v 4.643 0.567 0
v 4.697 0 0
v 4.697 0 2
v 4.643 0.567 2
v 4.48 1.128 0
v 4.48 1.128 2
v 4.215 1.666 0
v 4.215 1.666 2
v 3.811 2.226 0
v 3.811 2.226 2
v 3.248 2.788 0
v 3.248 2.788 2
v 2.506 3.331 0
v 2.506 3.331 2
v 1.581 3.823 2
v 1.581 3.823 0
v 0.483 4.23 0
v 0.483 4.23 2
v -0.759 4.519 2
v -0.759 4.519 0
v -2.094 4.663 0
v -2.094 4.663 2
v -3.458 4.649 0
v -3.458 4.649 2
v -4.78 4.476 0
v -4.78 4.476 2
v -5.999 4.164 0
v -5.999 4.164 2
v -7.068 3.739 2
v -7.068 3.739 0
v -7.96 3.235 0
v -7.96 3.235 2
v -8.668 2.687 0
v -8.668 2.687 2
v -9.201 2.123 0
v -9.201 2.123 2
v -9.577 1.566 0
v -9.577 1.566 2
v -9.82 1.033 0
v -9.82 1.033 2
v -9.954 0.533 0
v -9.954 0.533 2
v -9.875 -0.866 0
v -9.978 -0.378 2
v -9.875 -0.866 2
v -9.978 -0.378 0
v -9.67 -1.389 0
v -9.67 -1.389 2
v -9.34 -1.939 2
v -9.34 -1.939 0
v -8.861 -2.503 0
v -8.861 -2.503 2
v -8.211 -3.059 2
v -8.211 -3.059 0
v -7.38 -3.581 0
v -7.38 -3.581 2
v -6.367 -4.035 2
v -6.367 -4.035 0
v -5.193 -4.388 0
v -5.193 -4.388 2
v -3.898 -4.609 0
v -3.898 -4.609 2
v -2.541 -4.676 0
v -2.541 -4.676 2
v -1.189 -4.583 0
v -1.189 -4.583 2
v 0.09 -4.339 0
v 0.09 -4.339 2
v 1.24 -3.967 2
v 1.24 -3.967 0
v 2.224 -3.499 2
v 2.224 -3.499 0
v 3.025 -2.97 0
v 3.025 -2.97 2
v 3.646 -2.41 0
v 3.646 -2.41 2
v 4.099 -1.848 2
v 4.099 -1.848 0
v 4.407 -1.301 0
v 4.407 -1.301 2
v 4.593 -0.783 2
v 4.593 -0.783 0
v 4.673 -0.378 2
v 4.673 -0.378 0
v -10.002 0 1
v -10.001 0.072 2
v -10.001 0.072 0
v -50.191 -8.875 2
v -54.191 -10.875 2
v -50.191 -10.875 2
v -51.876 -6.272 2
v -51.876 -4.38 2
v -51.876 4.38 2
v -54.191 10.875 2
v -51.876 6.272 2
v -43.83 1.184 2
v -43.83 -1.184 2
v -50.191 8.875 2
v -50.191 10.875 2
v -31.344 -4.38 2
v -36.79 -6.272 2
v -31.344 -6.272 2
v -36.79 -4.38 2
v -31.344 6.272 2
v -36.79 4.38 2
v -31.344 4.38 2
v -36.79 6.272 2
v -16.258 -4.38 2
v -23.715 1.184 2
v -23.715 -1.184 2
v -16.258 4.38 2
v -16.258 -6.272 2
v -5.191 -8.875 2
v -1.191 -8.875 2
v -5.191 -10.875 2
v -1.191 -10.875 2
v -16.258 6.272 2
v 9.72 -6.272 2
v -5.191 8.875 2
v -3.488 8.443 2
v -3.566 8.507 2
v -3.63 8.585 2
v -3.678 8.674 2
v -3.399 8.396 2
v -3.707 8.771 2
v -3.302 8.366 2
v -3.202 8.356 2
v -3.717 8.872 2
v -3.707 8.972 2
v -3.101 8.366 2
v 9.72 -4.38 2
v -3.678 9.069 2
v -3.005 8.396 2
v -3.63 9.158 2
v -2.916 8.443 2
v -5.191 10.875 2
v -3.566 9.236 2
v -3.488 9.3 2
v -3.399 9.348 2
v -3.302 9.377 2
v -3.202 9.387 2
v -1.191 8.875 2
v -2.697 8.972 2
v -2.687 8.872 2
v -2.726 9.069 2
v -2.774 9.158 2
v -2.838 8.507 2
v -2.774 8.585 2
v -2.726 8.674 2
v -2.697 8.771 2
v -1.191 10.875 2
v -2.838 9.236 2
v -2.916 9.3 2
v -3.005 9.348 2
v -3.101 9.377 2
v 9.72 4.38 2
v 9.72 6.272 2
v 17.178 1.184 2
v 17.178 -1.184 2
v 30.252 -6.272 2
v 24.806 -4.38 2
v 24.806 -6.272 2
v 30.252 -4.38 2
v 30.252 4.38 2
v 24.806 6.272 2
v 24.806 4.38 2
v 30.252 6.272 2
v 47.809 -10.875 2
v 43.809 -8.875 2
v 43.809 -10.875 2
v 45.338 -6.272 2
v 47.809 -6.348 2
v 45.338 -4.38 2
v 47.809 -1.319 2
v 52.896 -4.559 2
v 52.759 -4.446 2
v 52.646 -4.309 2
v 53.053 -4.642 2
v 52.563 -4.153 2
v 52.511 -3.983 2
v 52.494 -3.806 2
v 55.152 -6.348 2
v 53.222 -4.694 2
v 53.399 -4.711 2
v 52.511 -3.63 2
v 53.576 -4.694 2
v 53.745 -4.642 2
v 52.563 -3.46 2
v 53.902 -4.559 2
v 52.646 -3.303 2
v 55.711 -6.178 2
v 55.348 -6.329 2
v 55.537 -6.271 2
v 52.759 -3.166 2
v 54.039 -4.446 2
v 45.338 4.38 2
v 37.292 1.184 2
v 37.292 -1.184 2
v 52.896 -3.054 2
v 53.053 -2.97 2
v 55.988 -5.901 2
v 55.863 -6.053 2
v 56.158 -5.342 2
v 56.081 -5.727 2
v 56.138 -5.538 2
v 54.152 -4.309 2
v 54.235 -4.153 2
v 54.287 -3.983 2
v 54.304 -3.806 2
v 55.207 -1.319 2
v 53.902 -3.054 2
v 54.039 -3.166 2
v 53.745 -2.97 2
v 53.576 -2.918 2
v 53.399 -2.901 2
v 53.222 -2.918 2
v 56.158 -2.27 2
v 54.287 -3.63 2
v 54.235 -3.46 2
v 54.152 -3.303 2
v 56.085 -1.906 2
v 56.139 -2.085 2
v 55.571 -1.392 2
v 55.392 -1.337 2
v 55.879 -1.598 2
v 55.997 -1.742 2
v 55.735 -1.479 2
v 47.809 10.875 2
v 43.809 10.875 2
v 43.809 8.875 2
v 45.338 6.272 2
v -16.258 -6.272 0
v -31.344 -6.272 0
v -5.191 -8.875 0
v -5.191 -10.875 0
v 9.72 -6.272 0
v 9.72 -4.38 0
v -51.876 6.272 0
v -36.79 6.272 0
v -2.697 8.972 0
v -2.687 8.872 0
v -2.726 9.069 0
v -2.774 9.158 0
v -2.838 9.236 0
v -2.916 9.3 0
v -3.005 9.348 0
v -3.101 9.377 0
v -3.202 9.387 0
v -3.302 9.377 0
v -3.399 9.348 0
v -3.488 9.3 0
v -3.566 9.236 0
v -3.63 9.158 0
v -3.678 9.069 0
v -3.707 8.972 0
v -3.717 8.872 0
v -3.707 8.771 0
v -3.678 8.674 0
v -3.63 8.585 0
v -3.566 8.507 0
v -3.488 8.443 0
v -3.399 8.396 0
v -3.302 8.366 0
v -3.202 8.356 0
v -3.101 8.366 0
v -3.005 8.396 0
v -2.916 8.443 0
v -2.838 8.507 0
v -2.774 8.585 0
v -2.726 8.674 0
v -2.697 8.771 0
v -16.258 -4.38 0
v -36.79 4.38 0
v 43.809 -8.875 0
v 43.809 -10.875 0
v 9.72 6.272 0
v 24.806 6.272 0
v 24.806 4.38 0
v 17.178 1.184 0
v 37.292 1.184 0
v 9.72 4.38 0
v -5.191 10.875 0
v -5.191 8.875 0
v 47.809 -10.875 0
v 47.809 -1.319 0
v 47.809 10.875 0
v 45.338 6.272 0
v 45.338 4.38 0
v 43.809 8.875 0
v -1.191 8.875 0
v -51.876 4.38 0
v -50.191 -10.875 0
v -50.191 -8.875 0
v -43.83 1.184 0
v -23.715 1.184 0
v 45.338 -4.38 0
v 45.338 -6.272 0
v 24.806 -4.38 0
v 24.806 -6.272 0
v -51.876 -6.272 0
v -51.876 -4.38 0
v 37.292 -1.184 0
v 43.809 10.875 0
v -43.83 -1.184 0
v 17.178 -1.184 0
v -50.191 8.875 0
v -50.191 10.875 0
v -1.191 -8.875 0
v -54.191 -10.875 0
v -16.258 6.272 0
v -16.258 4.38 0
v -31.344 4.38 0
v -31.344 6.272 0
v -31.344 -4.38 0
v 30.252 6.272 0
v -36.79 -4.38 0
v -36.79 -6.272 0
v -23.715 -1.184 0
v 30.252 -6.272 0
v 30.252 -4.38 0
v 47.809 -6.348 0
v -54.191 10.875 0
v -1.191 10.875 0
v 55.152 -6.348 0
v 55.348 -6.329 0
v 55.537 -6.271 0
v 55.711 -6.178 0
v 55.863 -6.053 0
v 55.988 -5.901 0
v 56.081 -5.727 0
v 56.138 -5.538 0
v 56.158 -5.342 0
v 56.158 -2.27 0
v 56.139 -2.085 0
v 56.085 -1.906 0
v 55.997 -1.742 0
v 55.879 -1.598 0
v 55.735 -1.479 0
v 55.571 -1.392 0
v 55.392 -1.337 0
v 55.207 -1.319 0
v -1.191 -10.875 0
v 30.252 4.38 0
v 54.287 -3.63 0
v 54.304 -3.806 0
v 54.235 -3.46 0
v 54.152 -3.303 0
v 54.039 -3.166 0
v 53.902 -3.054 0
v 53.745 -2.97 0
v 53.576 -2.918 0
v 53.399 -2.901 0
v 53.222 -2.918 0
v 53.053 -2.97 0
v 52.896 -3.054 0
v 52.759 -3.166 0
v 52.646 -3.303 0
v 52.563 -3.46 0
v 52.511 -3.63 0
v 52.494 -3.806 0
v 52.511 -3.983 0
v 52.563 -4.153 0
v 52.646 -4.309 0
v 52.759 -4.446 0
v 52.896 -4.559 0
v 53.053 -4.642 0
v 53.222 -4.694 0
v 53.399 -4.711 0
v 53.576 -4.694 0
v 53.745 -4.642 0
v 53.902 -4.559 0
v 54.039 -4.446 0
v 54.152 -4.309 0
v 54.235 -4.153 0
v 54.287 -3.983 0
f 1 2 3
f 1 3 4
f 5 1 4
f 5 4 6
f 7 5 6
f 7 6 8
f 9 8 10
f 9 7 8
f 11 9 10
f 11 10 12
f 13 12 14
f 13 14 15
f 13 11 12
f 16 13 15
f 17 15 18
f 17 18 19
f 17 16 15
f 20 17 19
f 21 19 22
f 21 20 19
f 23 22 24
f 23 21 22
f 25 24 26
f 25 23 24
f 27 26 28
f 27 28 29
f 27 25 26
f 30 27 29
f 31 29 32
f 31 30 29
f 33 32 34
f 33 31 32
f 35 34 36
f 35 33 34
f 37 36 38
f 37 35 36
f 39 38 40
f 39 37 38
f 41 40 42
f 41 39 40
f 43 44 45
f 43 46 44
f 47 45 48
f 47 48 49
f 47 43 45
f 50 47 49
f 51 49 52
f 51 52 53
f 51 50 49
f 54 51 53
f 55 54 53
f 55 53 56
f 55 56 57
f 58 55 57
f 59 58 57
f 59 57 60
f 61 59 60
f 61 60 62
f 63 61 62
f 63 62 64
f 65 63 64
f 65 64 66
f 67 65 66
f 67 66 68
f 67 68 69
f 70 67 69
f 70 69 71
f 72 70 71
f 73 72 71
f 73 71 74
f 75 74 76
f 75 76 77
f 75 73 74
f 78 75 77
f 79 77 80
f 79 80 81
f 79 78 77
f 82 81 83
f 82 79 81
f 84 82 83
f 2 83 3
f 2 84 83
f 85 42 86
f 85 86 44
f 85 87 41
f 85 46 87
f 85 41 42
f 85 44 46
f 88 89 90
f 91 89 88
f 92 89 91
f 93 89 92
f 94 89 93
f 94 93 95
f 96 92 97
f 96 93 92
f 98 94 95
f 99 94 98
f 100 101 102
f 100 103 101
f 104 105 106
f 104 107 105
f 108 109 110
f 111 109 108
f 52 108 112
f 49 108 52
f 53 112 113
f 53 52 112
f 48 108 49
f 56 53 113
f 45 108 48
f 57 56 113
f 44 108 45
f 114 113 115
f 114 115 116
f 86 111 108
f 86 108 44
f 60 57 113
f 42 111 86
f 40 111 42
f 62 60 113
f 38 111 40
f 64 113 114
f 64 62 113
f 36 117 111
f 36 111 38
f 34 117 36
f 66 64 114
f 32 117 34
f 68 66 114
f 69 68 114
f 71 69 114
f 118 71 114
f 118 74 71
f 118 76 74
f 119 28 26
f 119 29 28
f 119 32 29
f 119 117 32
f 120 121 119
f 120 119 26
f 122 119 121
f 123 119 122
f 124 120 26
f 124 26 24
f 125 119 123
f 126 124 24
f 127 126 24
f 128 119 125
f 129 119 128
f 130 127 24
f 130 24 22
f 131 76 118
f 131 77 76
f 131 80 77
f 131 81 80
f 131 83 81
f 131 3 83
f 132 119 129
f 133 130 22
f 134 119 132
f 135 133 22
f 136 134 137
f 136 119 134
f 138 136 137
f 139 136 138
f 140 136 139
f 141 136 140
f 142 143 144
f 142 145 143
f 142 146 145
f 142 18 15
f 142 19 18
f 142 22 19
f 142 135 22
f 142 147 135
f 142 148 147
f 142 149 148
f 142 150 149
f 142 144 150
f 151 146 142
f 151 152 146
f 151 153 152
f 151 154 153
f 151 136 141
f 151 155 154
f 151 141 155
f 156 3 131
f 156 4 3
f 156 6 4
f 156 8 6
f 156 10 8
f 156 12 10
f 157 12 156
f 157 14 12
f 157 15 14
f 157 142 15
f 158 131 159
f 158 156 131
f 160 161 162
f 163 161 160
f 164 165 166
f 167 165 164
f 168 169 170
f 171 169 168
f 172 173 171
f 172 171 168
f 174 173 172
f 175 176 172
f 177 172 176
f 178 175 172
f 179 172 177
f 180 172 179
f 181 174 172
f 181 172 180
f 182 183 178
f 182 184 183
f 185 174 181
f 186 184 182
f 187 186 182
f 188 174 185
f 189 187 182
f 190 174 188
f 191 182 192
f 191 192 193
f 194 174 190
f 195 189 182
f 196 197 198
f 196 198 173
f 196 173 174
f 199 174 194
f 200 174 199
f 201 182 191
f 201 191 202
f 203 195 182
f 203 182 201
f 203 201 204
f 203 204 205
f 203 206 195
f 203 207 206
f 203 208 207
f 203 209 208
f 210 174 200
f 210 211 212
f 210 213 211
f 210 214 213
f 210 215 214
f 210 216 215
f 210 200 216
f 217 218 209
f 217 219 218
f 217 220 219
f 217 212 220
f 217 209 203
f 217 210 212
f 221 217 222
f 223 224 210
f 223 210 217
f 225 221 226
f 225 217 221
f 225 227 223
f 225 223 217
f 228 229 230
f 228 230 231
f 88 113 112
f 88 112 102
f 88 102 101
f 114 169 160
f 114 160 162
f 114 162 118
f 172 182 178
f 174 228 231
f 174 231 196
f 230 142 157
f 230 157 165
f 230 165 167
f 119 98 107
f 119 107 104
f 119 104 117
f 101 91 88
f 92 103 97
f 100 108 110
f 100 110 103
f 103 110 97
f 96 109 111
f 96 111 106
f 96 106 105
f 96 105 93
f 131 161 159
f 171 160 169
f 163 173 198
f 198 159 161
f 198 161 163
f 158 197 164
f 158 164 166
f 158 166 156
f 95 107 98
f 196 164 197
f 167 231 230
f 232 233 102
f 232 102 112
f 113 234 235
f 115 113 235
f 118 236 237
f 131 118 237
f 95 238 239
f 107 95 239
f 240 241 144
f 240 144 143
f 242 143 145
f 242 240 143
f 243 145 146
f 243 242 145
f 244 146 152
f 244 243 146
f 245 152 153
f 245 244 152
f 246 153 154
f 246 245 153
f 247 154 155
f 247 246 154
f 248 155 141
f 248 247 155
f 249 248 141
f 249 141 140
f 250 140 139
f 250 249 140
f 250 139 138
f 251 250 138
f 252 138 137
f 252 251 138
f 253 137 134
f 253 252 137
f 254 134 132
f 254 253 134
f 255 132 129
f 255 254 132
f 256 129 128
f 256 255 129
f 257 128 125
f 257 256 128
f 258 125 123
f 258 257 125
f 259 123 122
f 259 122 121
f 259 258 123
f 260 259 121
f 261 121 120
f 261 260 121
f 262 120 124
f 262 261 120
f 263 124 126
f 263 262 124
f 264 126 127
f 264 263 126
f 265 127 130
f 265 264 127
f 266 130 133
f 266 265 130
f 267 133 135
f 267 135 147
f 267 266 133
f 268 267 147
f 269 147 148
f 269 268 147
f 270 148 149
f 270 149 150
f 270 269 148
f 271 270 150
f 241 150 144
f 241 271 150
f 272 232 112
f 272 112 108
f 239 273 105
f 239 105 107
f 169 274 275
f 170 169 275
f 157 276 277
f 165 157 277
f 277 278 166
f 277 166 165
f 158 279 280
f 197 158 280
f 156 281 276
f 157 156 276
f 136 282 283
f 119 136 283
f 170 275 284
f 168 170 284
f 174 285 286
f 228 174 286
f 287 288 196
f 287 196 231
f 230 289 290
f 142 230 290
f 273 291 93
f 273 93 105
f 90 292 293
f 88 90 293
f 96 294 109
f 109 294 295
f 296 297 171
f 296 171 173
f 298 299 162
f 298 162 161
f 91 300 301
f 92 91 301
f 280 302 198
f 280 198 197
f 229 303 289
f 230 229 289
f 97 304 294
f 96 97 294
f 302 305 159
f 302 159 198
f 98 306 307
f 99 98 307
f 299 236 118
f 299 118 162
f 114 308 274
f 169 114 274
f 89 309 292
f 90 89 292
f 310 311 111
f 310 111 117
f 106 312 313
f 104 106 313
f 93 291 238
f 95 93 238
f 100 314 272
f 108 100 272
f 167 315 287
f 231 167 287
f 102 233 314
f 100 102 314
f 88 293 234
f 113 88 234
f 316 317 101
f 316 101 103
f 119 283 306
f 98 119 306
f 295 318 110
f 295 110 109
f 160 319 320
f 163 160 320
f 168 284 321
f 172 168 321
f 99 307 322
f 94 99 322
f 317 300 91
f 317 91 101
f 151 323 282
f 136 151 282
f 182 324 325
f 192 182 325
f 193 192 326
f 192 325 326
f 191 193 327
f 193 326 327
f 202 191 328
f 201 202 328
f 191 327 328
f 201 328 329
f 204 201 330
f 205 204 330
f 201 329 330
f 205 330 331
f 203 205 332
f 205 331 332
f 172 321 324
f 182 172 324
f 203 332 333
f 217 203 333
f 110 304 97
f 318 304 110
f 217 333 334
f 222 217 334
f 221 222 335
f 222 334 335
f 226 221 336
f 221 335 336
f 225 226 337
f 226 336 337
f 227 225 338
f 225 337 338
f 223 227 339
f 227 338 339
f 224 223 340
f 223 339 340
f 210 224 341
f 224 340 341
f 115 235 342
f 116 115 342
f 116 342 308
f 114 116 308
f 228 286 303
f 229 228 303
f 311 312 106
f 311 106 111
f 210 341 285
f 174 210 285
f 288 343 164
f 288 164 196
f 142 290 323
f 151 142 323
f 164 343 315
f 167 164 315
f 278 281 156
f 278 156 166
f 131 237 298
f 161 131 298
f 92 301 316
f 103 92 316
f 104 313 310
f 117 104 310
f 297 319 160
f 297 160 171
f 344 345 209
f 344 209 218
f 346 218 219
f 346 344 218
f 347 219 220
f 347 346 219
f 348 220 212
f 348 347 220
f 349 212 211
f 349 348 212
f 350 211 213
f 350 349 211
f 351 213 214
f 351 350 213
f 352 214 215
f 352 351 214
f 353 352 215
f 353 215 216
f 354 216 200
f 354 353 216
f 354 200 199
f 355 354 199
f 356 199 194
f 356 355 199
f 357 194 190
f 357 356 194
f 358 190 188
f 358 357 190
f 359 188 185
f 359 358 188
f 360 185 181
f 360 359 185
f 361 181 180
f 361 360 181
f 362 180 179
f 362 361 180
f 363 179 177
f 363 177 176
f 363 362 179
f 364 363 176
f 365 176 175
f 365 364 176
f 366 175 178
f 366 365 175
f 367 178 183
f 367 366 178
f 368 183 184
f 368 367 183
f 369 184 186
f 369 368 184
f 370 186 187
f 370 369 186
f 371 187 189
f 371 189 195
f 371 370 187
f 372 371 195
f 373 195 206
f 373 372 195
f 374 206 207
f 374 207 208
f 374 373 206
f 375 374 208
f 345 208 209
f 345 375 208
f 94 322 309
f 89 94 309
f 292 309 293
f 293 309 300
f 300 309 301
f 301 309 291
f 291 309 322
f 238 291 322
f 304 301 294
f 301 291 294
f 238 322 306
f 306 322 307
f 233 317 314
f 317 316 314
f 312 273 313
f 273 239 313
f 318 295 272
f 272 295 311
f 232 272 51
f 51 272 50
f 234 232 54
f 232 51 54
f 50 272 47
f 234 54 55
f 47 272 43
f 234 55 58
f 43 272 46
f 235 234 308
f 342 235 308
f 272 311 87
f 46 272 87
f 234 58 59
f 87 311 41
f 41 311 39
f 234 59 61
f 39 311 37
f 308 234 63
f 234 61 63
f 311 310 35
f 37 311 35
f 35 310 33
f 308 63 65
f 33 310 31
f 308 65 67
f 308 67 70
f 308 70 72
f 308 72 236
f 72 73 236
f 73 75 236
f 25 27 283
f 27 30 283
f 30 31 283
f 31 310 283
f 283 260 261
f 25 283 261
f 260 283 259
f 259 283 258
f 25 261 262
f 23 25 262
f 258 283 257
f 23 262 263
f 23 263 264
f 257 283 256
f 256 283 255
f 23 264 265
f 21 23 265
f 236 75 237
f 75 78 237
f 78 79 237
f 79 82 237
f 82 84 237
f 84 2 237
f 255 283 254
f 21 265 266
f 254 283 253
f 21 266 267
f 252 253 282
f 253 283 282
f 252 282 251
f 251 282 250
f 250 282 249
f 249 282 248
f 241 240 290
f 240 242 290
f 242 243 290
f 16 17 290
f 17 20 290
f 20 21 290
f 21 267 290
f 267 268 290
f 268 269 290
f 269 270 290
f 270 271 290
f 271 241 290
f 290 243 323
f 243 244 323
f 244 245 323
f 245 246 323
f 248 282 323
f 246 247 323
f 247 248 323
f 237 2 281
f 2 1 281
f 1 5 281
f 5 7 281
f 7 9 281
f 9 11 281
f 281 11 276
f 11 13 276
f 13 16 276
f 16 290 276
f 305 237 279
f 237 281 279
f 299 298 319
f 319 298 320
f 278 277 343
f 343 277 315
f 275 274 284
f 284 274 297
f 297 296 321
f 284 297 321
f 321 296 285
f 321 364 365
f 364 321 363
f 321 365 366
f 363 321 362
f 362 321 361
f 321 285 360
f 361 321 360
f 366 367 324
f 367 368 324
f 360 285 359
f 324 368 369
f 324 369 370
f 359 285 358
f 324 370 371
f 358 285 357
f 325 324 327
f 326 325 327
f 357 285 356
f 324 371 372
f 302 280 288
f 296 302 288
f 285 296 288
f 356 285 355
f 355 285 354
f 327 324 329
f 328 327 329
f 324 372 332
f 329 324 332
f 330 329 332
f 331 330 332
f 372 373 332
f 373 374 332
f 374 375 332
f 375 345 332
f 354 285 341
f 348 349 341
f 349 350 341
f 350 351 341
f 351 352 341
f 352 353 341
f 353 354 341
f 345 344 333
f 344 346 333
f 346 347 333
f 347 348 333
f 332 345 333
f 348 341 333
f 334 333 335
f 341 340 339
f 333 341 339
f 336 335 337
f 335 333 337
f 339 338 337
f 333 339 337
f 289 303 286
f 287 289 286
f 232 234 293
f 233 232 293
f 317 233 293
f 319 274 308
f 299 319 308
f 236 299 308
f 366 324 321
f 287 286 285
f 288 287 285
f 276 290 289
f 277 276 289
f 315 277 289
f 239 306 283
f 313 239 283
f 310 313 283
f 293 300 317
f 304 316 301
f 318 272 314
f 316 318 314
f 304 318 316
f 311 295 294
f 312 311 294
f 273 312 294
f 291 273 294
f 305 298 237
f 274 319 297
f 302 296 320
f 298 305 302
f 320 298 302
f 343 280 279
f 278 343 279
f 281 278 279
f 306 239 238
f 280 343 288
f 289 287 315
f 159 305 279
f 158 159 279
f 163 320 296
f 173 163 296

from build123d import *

# Parameters (mm, degrees)
SKETCH_1_R      = 0.515131583
SKETCH_1_R_2    = 0.905156807
SKETCH_1_W      = 20.114595703
SKETCH_1_H      = 2.368886762
SKETCH_1_W_2    = 15.085946791
SKETCH_1_H_2    = 1.892012434
SKETCH_1_W_3    = 15.085946792
SKETCH_1_W_4    = 20.114595731
EXTRUDE_1_DEPTH = 2


with BuildPart() as part:
    # 草图1 → 凸台-拉伸1 (new body)
    with BuildSketch(Plane.XY):
        with BuildLine():
            Line((-50.190600039, 8.875), (-50.190600039, 10.875))
            Line((-50.190600039, 10.875), (-54.190600039, 10.875))
            Line((-54.190600039, 10.875), (-54.190600039, -10.875))
            Line((-54.190600039, -10.875), (-50.190600039, -10.875))
            Line((-50.190600039, -10.875), (-50.190600039, -8.875))
            Line((-50.190600039, -8.875), (-5.190600039, -8.875))
            Line((-5.190600039, -8.875), (-5.190600039, -10.875))
            Line((-5.190600039, -10.875), (-1.190600039, -10.875))
            Line((-1.190600039, -10.875), (-1.190600039, -8.875))
            Line((-1.190600039, -8.875), (43.809399961, -8.875))
            Line((43.809399961, -8.875), (43.809399961, -10.875))
            Line((43.809399961, -10.875), (47.809399961, -10.875))
            Line((47.809399961, -10.875), (47.809399961, -6.347874739))
            Line((47.809399961, -6.347874739), (55.152023354, -6.347874739))
            ThreePointArc((55.152023354, -6.347874739), (55.863181706, -6.053303305), (56.15775314, -5.342144953))
            Line((56.15775314, -5.342144953), (56.15775314, -2.27022032))
            ThreePointArc((56.15775314, -2.27022032), (55.879213296, -1.597765651), (55.206758627, -1.319225807))
            Line((55.206758627, -1.319225807), (47.809399961, -1.319225807))
            Line((47.809399961, -1.319225807), (47.809399961, 10.875))
            Line((47.809399961, 10.875), (43.809399961, 10.875))
            Line((43.809399961, 10.875), (43.809399961, 8.875))
            Line((43.809399961, 8.875), (-1.190600039, 8.875))
            Line((-1.190600039, 8.875), (-1.190600039, 10.875))
            Line((-1.190600039, 10.875), (-5.190600039, 10.875))
            Line((-5.190600039, 10.875), (-5.190600039, 8.875))
            Line((-5.190600039, 8.875), (-50.190600039, 8.875))
        make_face()
        with Locations((-3.201829172, 8.8715913)):
            Circle(SKETCH_1_R, mode=Mode.SUBTRACT)
        with Locations((53.398961702, -3.806182637)):
            Circle(SKETCH_1_R_2, mode=Mode.SUBTRACT)
        with Locations((27.235161442, 0)):
            Rectangle(SKETCH_1_W, SKETCH_1_H, mode=Mode.SUBTRACT)
        with Locations((37.795324202, -5.325848376)):
            Rectangle(SKETCH_1_W_2, SKETCH_1_H_2, mode=Mode.SUBTRACT)
        with Locations((17.263351195, -5.325848376)):
            Rectangle(SKETCH_1_W_3, SKETCH_1_H_2, mode=Mode.SUBTRACT)
        with Locations((-23.800594817, -5.325848376)):
            Rectangle(SKETCH_1_W_2, SKETCH_1_H_2, mode=Mode.SUBTRACT)
        with Locations((-44.332567795, -5.325848376)):
            Rectangle(SKETCH_1_W_3, SKETCH_1_H_2, mode=Mode.SUBTRACT)
        with Locations((-33.77240505, 0)):
            Rectangle(SKETCH_1_W_4, SKETCH_1_H, mode=Mode.SUBTRACT)
        with Locations((37.795324202, 5.325848376)):
            Rectangle(SKETCH_1_W_2, SKETCH_1_H_2, mode=Mode.SUBTRACT)
        with Locations((17.263351195, 5.325848376)):
            Rectangle(SKETCH_1_W_3, SKETCH_1_H_2, mode=Mode.SUBTRACT)
        with Locations((-23.800594817, 5.325848376)):
            Rectangle(SKETCH_1_W_2, SKETCH_1_H_2, mode=Mode.SUBTRACT)
        with Locations((-44.332567795, 5.325848376)):
            Rectangle(SKETCH_1_W_3, SKETCH_1_H_2, mode=Mode.SUBTRACT)
        with BuildLine():
            add(Edge.make_bspline(
                [(-10.001566069, 0), (-10.001566069, -9.353540745), (4.696855103, -9.353540745), (4.696855103, 0)],
                knots=[0, 0, 0, 0, 1, 1, 1, 1], degree=3, weights=[1, 0.333333333, 0.333333333, 1]))
            add(Edge.make_bspline(
                [(4.696855103, 0), (4.696855103, 9.353540745), (-10.001566069, 9.353540745), (-10.001566069, 0)],
                knots=[0, 0, 0, 0, 1, 1, 1, 1], degree=3, weights=[1, 0.333333333, 0.333333333, 1]))
        make_face(mode=Mode.SUBTRACT)
    extrude(amount=EXTRUDE_1_DEPTH)


solid = part.part
